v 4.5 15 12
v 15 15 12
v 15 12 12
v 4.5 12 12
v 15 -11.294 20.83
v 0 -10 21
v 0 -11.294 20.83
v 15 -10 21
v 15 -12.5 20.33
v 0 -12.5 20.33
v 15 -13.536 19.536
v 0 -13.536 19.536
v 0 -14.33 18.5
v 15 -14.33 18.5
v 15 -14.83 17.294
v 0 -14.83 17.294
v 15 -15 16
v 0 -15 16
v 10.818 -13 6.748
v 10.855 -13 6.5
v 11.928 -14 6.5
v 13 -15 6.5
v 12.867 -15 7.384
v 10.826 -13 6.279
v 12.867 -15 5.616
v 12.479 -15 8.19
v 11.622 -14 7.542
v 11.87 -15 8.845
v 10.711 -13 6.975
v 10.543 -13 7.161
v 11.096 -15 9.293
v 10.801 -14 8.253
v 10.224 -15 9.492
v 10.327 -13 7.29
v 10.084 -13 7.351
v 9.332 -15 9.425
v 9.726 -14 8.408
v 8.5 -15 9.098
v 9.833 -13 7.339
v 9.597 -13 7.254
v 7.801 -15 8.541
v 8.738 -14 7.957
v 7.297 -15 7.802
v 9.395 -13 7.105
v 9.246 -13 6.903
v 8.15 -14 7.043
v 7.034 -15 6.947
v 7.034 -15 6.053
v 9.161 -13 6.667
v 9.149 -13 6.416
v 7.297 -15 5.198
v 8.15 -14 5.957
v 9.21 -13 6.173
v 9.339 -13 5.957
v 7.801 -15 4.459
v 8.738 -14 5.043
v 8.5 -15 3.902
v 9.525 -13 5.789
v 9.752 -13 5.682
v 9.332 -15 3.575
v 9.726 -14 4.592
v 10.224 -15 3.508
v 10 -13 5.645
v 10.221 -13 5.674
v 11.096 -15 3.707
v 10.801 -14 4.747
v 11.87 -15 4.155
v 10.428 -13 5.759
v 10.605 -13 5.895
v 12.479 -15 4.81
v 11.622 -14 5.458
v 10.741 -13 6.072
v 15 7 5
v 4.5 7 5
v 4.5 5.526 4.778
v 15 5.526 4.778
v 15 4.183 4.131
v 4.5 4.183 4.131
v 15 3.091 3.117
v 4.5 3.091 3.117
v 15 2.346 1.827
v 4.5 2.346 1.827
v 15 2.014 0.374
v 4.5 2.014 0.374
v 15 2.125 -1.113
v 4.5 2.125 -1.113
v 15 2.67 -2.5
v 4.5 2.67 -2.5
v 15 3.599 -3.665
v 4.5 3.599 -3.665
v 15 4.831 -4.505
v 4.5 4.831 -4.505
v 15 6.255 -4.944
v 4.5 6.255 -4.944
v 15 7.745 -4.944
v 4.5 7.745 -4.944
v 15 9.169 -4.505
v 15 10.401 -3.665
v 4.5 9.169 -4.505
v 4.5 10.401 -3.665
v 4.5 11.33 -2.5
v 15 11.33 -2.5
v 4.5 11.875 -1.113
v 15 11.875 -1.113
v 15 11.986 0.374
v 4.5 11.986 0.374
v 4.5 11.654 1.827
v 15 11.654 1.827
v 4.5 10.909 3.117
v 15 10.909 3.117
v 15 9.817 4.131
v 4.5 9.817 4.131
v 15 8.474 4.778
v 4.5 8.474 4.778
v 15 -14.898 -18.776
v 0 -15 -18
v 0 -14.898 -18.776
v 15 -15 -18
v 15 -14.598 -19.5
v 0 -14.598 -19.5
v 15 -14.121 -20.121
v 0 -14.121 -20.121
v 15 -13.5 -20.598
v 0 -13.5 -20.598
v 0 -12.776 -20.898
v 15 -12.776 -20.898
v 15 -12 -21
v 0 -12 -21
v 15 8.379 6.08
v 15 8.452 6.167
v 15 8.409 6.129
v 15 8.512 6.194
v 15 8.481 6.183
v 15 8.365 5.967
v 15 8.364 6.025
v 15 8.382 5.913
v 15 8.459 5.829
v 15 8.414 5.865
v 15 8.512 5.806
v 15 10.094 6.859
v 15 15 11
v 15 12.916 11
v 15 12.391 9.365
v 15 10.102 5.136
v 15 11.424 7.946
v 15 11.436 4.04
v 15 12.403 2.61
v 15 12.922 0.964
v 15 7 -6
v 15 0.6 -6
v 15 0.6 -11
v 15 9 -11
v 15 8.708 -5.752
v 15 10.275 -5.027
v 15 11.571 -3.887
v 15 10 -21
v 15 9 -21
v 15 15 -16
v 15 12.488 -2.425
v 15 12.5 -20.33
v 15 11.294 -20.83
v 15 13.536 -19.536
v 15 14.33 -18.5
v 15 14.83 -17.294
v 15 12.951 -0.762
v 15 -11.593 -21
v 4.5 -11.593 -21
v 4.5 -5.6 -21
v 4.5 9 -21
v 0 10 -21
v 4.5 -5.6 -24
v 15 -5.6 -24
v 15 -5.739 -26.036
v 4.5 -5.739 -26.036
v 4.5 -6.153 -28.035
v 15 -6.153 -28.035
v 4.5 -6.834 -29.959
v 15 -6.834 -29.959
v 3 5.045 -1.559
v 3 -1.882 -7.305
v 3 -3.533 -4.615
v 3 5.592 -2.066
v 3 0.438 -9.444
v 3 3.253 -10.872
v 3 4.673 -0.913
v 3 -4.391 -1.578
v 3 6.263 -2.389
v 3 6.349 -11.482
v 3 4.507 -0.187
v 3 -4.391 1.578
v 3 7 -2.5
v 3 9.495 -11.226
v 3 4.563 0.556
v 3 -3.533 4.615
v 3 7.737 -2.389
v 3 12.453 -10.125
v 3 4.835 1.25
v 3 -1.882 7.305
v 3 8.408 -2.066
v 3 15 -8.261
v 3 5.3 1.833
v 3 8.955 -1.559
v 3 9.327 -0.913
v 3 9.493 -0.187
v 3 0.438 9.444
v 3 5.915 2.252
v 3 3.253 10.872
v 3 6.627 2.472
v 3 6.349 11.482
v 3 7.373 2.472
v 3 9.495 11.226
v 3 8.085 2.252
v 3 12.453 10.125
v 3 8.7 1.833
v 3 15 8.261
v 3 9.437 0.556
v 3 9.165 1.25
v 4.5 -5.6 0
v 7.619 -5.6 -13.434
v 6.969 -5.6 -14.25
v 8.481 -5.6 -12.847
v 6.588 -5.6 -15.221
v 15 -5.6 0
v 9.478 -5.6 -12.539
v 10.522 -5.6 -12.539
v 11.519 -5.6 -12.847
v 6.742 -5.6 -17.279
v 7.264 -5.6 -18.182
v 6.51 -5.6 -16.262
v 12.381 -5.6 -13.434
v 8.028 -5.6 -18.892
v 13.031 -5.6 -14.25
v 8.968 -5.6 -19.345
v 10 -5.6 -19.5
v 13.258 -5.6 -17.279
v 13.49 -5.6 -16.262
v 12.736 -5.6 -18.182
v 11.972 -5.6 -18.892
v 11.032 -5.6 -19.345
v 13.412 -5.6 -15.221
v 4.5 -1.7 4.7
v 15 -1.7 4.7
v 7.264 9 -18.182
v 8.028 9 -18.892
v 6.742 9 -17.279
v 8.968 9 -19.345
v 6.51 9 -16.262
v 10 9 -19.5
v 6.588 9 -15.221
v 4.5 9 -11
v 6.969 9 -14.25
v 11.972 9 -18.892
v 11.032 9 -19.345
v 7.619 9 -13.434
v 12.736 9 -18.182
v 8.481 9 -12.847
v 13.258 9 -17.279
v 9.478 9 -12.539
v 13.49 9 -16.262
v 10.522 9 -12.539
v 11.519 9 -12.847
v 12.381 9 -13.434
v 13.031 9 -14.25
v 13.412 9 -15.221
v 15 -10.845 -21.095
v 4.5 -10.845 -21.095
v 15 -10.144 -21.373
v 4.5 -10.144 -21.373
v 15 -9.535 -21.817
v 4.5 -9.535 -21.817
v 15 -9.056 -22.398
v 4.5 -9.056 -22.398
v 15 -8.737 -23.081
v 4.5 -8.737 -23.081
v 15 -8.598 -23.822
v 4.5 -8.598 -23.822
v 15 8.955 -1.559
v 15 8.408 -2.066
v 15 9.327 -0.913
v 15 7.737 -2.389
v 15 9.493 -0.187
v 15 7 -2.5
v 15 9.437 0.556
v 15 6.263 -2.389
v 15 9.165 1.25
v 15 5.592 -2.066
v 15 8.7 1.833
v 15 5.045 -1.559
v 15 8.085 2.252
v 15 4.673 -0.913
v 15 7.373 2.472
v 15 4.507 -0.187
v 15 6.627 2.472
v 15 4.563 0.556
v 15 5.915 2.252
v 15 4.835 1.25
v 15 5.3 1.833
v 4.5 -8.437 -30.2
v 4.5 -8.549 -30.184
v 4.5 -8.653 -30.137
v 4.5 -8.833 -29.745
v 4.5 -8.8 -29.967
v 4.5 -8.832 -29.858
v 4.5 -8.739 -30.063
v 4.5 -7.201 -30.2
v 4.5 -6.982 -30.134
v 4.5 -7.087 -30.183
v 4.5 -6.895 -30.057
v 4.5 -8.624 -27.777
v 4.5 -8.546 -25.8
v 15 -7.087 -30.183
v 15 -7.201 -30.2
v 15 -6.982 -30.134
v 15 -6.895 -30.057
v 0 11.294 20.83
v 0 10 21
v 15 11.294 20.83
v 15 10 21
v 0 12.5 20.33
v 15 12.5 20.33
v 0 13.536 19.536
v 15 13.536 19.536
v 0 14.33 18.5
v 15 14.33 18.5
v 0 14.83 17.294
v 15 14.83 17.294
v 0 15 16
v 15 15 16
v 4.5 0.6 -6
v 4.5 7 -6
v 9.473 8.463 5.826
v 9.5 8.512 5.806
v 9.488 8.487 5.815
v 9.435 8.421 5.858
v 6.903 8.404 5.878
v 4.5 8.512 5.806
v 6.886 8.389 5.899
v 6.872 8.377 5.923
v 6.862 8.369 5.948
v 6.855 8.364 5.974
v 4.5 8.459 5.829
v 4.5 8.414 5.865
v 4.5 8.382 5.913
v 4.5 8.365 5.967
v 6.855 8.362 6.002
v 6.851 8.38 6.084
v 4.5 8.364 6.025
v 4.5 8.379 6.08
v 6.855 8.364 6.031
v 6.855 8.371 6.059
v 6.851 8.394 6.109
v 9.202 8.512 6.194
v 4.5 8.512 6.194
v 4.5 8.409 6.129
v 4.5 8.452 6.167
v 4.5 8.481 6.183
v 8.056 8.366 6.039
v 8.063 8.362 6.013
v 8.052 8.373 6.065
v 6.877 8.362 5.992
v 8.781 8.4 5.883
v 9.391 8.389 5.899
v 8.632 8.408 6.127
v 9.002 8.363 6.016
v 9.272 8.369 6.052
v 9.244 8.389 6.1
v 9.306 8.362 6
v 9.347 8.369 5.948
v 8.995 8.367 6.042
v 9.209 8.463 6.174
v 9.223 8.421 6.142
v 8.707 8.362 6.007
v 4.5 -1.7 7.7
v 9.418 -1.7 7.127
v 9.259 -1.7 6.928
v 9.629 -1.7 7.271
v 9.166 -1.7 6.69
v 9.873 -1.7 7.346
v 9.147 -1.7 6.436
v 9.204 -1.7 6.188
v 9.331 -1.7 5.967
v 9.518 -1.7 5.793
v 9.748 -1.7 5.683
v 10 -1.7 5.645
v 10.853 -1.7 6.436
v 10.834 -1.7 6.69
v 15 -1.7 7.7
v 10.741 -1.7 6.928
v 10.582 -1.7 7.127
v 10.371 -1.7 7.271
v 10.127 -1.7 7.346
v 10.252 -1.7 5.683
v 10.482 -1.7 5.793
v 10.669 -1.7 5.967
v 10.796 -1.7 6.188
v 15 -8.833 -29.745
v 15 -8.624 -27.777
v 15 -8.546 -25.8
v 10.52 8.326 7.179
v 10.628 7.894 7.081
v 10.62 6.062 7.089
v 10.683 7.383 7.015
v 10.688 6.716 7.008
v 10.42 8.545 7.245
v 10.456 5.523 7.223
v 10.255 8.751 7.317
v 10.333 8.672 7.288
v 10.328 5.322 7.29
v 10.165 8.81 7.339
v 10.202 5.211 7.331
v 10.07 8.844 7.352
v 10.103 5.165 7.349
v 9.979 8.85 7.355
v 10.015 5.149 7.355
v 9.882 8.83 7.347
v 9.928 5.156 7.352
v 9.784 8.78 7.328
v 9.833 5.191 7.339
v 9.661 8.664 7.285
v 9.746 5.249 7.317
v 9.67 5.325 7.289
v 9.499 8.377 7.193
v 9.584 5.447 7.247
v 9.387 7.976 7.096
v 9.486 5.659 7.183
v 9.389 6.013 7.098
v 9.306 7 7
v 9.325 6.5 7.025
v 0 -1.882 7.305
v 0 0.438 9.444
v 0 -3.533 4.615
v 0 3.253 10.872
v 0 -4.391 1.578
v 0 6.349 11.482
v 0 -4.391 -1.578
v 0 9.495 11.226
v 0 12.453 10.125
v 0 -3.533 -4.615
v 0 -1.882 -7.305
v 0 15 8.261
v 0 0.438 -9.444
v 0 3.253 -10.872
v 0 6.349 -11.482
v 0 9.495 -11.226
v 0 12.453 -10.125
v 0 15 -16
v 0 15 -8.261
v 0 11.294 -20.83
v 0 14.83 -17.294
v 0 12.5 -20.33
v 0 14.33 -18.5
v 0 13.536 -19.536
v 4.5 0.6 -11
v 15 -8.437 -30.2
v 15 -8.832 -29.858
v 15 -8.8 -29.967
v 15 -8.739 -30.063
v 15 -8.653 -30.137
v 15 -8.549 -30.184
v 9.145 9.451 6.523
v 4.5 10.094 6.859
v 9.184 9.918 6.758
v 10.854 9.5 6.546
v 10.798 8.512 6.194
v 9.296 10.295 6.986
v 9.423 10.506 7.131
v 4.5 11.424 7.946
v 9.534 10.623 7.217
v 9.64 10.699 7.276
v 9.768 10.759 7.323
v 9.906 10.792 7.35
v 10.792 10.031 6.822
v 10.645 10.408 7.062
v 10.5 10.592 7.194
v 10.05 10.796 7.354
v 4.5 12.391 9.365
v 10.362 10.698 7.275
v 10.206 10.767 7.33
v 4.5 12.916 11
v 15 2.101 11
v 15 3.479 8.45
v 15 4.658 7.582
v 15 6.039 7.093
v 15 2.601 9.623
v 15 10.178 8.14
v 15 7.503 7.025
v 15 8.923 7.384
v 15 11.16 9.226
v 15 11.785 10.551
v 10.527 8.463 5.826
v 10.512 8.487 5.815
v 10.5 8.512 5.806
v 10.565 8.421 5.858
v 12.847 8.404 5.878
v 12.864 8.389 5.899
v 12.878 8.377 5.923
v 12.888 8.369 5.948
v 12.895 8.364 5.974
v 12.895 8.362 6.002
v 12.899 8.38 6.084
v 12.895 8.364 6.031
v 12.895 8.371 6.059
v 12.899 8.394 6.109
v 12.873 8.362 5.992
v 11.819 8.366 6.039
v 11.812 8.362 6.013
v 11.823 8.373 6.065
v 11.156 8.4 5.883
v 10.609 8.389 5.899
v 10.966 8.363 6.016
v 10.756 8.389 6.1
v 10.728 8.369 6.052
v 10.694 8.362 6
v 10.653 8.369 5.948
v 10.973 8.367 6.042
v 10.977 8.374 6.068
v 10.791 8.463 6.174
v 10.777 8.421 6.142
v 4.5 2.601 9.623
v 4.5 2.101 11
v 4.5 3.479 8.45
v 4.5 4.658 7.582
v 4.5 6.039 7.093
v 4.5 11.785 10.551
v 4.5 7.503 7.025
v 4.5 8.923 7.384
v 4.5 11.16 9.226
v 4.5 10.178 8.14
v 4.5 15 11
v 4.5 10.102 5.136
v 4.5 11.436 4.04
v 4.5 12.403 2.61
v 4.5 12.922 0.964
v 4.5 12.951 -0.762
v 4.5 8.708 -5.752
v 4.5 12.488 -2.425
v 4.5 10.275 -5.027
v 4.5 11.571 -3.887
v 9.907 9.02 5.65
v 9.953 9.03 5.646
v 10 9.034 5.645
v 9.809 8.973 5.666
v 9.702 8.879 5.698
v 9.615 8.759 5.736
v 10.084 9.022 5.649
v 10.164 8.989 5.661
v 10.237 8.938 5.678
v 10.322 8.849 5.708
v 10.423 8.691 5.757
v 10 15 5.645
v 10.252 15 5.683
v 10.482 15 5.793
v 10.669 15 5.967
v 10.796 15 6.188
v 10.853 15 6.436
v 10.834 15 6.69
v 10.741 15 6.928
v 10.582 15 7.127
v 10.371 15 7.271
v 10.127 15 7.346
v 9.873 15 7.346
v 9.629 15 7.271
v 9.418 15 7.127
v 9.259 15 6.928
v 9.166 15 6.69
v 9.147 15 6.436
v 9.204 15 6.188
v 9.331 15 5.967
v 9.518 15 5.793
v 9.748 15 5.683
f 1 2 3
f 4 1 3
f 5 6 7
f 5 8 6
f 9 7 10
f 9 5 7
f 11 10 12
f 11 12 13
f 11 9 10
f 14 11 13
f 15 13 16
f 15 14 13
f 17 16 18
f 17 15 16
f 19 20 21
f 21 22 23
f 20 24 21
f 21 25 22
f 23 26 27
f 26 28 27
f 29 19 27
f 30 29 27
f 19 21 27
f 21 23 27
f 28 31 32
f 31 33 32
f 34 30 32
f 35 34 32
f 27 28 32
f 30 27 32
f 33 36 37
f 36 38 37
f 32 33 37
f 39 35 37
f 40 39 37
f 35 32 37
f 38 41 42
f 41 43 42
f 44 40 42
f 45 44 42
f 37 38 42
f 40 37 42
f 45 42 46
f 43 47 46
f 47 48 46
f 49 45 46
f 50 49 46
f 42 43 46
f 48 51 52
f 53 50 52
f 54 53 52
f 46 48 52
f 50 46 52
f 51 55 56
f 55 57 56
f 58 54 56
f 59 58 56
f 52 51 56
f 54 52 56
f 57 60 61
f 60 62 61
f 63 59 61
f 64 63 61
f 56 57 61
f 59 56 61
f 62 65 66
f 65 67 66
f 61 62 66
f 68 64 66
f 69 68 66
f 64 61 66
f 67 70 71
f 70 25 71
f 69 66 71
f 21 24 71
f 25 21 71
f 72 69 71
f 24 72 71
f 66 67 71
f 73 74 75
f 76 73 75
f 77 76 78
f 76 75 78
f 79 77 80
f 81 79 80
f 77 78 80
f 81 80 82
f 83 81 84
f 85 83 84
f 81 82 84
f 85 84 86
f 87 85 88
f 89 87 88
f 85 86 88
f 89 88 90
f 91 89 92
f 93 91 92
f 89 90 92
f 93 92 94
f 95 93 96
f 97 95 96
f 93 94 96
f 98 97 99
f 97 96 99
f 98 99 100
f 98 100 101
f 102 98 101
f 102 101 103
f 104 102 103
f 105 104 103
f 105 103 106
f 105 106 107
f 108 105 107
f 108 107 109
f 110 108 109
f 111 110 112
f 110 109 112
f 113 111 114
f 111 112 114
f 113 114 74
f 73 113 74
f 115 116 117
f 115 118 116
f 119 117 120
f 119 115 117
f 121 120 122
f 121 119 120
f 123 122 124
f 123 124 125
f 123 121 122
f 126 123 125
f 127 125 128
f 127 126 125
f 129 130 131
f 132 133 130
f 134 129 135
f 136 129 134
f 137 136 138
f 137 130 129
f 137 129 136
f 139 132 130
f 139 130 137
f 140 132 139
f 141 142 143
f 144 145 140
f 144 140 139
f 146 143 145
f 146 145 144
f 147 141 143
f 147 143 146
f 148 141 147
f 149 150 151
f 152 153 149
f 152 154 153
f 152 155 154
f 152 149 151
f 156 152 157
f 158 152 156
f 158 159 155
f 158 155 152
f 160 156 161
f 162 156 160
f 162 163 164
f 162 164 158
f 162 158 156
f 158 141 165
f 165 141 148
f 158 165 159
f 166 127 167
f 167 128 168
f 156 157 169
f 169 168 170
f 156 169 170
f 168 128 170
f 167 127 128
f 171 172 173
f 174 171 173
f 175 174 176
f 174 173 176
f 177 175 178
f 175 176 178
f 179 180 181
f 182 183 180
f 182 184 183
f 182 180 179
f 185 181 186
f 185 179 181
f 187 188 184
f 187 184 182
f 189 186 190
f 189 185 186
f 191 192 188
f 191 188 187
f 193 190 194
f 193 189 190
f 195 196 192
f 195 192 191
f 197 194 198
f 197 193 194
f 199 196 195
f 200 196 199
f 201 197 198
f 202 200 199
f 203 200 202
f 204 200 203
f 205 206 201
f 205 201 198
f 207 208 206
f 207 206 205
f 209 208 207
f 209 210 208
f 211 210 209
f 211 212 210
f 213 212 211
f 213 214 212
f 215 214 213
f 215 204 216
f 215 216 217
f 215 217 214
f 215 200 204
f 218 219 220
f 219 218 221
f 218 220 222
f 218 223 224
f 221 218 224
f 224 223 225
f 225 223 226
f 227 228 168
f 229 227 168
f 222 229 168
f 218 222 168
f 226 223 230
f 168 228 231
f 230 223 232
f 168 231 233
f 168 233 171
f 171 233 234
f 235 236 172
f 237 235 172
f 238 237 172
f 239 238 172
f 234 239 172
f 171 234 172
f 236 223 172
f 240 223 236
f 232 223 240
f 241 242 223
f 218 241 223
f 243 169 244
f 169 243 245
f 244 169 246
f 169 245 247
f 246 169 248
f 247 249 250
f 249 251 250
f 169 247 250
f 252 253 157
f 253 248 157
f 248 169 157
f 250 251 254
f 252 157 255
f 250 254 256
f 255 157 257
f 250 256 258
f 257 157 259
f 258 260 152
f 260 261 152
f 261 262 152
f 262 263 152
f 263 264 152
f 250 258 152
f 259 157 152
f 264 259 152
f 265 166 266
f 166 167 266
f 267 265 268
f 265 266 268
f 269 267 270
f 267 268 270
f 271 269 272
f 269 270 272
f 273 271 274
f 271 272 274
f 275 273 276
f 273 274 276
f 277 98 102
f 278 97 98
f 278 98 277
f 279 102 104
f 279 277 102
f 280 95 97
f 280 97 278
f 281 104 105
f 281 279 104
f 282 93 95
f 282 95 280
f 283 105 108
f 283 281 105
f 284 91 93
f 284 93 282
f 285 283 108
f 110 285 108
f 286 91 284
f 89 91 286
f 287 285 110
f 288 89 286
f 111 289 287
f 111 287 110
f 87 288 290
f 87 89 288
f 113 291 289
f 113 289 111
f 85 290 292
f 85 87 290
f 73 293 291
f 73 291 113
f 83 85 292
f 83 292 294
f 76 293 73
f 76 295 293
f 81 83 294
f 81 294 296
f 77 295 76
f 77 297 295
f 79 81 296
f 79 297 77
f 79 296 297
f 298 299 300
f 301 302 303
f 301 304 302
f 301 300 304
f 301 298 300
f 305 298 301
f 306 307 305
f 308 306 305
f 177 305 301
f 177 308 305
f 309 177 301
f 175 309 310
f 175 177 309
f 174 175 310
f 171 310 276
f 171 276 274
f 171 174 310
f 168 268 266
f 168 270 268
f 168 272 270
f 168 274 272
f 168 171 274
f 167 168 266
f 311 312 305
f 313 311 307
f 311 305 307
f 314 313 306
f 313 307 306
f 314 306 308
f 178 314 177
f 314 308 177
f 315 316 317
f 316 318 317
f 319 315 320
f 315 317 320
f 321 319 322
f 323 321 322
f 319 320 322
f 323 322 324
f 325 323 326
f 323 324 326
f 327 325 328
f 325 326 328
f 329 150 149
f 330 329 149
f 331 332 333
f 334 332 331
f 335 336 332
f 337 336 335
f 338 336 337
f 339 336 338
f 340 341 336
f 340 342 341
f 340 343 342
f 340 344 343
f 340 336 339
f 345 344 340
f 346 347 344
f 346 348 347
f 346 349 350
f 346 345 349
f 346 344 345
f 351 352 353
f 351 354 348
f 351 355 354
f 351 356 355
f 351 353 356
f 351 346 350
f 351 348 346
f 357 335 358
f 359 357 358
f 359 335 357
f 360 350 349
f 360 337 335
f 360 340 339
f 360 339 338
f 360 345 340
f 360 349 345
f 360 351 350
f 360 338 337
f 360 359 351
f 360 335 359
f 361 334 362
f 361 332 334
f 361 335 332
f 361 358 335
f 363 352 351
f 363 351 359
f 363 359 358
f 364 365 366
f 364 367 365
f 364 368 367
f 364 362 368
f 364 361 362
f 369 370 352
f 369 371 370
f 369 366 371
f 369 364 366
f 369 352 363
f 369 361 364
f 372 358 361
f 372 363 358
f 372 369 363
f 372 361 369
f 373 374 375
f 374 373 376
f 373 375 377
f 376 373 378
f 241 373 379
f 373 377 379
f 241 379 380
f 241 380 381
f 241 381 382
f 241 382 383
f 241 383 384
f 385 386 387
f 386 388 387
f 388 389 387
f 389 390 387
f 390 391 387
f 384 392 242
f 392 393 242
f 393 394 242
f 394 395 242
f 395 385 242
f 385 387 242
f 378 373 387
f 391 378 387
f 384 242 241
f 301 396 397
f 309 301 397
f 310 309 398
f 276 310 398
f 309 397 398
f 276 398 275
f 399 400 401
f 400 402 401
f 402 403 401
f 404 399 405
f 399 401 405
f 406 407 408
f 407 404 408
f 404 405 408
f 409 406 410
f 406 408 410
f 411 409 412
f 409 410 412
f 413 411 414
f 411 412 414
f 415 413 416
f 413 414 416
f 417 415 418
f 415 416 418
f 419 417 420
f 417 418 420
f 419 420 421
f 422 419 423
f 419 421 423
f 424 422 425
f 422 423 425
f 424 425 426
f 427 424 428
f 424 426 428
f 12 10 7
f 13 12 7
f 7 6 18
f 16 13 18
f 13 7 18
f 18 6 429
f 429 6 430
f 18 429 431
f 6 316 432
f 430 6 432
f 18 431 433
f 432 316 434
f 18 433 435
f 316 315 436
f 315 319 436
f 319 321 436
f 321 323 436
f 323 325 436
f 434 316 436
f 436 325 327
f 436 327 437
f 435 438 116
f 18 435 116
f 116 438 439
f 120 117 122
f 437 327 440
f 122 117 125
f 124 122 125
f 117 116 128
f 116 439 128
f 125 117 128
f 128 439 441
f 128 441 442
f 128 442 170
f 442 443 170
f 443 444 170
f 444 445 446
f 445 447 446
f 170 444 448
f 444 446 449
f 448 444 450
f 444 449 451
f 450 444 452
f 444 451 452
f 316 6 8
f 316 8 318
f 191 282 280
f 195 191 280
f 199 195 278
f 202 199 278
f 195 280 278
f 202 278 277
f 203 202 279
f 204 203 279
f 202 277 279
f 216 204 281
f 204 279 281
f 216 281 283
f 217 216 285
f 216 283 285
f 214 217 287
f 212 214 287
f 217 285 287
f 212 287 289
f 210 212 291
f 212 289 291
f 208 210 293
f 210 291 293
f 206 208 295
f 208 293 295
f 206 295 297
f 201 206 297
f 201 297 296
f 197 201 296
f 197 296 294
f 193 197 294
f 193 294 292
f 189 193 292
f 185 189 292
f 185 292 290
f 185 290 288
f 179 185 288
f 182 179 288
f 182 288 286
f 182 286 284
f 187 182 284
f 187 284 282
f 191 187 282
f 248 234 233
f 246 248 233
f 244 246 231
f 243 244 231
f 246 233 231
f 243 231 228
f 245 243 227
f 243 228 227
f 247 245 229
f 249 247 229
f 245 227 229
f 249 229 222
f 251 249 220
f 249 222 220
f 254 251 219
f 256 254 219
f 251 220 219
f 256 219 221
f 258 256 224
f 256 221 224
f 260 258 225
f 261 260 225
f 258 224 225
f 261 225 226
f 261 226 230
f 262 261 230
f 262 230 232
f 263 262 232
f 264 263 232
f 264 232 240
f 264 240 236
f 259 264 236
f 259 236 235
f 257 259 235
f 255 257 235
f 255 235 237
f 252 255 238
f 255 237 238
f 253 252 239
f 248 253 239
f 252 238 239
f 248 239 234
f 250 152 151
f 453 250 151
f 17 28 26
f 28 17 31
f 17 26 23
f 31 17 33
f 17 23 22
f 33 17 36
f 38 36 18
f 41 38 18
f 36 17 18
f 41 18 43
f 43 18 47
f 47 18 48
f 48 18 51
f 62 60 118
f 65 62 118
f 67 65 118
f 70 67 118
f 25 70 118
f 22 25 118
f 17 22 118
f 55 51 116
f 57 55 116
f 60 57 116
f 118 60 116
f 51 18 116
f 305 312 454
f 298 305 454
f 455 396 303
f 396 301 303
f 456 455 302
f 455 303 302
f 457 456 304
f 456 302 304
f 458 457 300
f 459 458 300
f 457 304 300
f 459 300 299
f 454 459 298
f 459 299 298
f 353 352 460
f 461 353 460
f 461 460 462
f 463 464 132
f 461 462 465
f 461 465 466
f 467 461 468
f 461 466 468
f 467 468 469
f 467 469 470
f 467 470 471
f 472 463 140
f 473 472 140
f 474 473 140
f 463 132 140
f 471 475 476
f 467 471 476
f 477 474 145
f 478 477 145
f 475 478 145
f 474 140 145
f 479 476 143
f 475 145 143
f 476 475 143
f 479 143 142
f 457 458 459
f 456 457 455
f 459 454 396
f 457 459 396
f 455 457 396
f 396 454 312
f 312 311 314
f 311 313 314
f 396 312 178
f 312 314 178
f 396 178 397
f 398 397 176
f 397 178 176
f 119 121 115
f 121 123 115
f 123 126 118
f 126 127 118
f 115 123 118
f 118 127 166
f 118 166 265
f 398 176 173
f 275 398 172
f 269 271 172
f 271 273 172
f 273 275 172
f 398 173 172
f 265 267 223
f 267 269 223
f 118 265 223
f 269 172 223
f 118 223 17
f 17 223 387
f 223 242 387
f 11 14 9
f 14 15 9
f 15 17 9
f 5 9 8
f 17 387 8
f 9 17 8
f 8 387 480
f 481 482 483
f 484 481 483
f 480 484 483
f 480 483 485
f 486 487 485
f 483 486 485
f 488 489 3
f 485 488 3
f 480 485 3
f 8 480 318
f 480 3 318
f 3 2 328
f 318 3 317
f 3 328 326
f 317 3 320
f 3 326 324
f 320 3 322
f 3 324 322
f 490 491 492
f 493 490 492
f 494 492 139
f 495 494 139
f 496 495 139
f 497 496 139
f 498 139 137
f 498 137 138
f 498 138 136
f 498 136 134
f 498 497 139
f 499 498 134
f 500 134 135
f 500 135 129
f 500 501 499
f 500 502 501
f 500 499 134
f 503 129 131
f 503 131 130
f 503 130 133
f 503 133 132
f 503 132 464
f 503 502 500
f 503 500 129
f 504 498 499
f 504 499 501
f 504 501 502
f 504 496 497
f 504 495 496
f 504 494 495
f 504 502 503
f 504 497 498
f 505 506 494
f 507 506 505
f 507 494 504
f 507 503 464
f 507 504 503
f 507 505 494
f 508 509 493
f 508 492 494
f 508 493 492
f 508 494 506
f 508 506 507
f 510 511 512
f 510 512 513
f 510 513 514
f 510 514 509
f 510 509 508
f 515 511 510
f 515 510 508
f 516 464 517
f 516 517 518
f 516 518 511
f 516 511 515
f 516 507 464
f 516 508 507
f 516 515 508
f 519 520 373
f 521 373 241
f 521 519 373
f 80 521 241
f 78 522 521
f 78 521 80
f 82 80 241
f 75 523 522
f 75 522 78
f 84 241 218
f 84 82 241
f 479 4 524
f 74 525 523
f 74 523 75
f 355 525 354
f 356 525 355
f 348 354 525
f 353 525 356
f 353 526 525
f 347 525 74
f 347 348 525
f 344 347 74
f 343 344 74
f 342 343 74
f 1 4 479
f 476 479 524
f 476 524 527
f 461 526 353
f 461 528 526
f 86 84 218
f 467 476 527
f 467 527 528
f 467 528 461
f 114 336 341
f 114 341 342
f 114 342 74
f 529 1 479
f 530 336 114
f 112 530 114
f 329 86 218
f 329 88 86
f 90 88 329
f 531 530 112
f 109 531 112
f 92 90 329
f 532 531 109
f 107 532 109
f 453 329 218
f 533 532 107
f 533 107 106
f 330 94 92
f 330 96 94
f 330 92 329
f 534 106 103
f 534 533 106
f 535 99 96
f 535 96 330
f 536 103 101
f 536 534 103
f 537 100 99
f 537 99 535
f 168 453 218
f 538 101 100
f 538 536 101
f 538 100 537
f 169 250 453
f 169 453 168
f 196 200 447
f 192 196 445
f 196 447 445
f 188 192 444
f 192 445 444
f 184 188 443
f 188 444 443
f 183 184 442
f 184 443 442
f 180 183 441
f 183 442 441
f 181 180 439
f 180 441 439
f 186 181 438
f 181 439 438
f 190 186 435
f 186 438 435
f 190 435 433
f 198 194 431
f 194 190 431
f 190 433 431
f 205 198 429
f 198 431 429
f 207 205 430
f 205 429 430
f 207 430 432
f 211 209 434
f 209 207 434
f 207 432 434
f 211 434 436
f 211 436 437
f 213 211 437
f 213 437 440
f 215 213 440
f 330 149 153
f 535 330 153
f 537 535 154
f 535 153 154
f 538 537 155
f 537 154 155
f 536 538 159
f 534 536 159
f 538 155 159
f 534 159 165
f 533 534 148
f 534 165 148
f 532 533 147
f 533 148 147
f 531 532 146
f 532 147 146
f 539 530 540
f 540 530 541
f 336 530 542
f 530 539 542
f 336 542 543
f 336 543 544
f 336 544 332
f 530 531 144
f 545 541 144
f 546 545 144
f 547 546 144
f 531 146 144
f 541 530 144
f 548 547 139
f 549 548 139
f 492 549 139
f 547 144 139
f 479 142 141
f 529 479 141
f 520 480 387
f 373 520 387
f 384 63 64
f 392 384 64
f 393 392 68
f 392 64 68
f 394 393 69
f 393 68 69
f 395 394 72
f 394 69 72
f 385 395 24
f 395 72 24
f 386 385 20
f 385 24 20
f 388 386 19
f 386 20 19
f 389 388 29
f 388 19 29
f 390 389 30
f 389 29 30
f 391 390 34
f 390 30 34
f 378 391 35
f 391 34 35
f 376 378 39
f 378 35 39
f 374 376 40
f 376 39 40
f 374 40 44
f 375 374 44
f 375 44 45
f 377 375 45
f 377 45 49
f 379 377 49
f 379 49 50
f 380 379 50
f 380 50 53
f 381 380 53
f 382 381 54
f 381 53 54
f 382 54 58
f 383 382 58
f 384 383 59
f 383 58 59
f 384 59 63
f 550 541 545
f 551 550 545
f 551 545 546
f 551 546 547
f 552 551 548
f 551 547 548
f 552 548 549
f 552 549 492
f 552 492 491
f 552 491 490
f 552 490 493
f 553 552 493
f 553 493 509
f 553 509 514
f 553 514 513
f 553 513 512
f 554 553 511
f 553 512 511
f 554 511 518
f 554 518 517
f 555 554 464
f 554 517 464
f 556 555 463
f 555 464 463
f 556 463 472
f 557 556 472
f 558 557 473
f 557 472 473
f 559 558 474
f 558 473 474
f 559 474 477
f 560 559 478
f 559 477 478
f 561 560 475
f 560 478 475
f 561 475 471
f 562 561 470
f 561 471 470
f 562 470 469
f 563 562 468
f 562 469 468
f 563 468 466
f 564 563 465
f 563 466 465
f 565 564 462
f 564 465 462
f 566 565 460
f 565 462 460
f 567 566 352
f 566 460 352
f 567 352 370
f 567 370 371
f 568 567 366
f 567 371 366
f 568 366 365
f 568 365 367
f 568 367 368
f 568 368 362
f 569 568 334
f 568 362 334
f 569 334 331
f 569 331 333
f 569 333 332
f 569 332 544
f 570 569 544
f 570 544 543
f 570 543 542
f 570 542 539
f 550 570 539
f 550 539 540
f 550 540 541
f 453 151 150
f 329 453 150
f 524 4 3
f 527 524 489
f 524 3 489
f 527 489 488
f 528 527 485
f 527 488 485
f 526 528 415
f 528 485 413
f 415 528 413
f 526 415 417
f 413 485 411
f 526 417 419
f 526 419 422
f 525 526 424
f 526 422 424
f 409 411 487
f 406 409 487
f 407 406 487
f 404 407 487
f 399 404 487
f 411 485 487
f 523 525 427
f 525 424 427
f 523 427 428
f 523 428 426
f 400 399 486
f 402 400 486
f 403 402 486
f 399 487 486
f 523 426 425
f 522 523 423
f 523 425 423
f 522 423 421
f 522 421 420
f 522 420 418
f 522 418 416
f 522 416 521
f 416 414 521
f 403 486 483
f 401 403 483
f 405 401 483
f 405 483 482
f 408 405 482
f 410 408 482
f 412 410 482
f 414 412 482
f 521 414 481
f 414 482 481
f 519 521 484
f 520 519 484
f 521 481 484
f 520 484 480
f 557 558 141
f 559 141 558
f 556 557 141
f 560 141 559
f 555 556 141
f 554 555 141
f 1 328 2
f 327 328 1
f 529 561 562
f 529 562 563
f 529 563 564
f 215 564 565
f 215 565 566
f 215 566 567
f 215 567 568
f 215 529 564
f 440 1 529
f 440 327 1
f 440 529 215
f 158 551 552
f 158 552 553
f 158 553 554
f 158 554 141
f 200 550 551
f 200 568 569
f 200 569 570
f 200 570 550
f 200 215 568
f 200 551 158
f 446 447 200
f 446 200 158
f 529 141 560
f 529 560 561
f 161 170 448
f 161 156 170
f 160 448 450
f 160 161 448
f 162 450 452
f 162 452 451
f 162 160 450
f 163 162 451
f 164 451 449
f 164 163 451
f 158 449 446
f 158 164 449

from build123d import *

# Parameters (mm, degrees)
SKETCH1_W           = 42
SKETCH1_H           = 30
BOSS_EXTRUDE1_DEPTH = 15
FILLET1_R           = 5
CUT_EXTRUDE1_DEPTH  = 10.5
FILLET2_R           = 0.2
SKETCH3_R           = 3.5
BOSS_EXTRUDE2_DEPTH = 14.6
SKETCH4_R           = 5
BOSS_EXTRUDE3_DEPTH = 10.5
SKETCH5_R           = 3
CUT_EXTRUDE2_DEPTH  = 2
CUT_EXTRUDE2_DRAFT  = -47
SKETCH6_R           = 0.85526258
CUT_EXTRUDE3_DEPTH  = 39.078865697
SKETCH7_R           = 2.5
CUT_EXTRUDE4_DEPTH  = 30.849623234
BOSS_EXTRUDE4_DEPTH = 10.5
FILLET3_R           = 3
FILLET4_R           = 0.4
SKETCH9_R           = 11.5
CUT_EXTRUDE5_DEPTH  = 3


with BuildPart() as part:
    # Sketch1 → Boss-Extrude1 (new body)
    with BuildSketch(Plane(origin=(0, 0, 0), x_dir=(0, 0, -1), z_dir=(1, 0, 0))):
        Rectangle(SKETCH1_W, SKETCH1_H)
    extrude(amount=BOSS_EXTRUDE1_DEPTH)

    # Fillet1
    fillet1_edges = [part.edges().sort_by_distance(p)[0] for p in [
        (7.5, 15, 21),
        (7.5, 15, -21),
        (7.5, -15, 21),
    ]]
    fillet(fillet1_edges, radius=FILLET1_R)

    # Sketch2 → Cut-Extrude1 (cut)
    with BuildSketch(Plane(origin=(15, 0, 0), x_dir=(0, 0, -1), z_dir=(1, 0, 0))):
        with BuildLine():
            Line((21, 9), (11, 9))
            Line((11, 9), (11, 0.6))
            Line((11, 0.6), (6, 0.6))
            Line((6, 0.6), (6, 7))
            ThreePointArc((6, 7), (0, 13), (-6, 7))
            ThreePointArc((-6, 7), (-7.417424305, 10.872983346), (-11, 12.916079783))
            Line((-11, 12.916079783), (-11, 15))
            Line((-11, 15), (-12, 15))
            Line((-12, 15), (-12, 12))
            ThreePointArc((-12, 12), (-7.025319235, 7.50254481), (-11, 2.101020514))
            Line((-11, 2.101020514), (-7.7, -1.7))
            Line((-7.7, -1.7), (-4.7, -1.7))
            Line((-4.7, -1.7), (0, -5.6))
            Line((0, -5.6), (11, -5.6))
            Line((11, -5.6), (21, -5.6))
            Line((21, -5.6), (21, 9))
        make_face()
    extrude(amount=-CUT_EXTRUDE1_DEPTH, mode=Mode.SUBTRACT)

    # Fillet2
    fillet2_edges = [part.edges().sort_by_distance(p)[0] for p in [
        (9.75, 7, 6),
    ]]
    fillet(fillet2_edges, radius=FILLET2_R)

    # Sketch3 → Boss-Extrude2 (add)
    with BuildSketch(Plane(origin=(0, -5.6, 0), x_dir=(1, 0, 0), z_dir=(0, 1, 0))):
        with Locations(Location((10, 16, 0), (0, 0, 90))):
            Circle(SKETCH3_R)
    extrude(amount=BOSS_EXTRUDE2_DEPTH)

    # Sketch4 → Boss-Extrude3 (add)
    with BuildSketch(Plane(origin=(4.5, 0, 0), x_dir=(0, 0, -1), z_dir=(1, 0, 0))):
        with Locations(Location((0, 7, 0), (0, 0, 180))):
            Circle(SKETCH4_R)
    extrude(amount=BOSS_EXTRUDE3_DEPTH)


with BuildPart() as cut_extrude2_tool:
    # Sketch5 → Cut-Extrude2 (with draft: the straight prism first)
    with BuildSketch(Plane.XZ.offset(15)):
        with Locations((10, 6.5)):
            Circle(SKETCH5_R)
    extrude(amount=-CUT_EXTRUDE2_DEPTH)
    # Cut-Extrude2: the draft: its side faces are tilted about the plane it starts from
    cut_extrude2_sides = [cut_extrude2_tool.faces().sort_by_distance(p)[0] for p in [
        (7, -14, 6.5),
    ]]
    draft(cut_extrude2_sides, Plane.XZ.offset(15), CUT_EXTRUDE2_DRAFT)


with BuildPart() as part_1:
    add(part.part)

    # Cut-Extrude2: cut by cut_extrude2_tool
    add(cut_extrude2_tool.part, mode=Mode.SUBTRACT)

    # Sketch6 → Cut-Extrude3 (cut, through all)
    with BuildSketch(Plane.XZ.offset(13)):
        with Locations(Location((10, 6.5, 0), (0, 0, 270))):
            Circle(SKETCH6_R)
    extrude(amount=-CUT_EXTRUDE3_DEPTH, mode=Mode.SUBTRACT)

    # Sketch7 → Cut-Extrude4 (cut, through all)
    with BuildSketch(Plane(origin=(15, 0, 0), x_dir=(0, 0, -1), z_dir=(1, 0, 0))):
        with Locations((0, 7)):
            Circle(SKETCH7_R)
    extrude(amount=-CUT_EXTRUDE4_DEPTH, mode=Mode.SUBTRACT)

    # Sketch8 → Boss-Extrude4 (add)
    with BuildSketch(Plane(origin=(15, 0, 0), x_dir=(0, 0, -1), z_dir=(1, 0, 0))):
        with BuildLine():
            Line((21, -5.6), (24, -5.6))
            ThreePointArc((24, -5.6), (27.171714604, -5.939160103), (30.2, -6.941303137))
            Line((30.2, -6.941303137), (30.2, -8.9))
            ThreePointArc((30.2, -8.9), (25.6, -8.545235705), (21, -8.9))
            Line((21, -8.9), (21, -5.6))
        make_face()
    extrude(amount=-BOSS_EXTRUDE4_DEPTH)

    # Fillet3
    fillet3_edges = [part_1.edges().sort_by_distance(p)[0] for p in [
        (9.75, -8.9, -21),
        (7.5, -15, -21),
    ]]
    fillet(fillet3_edges, radius=FILLET3_R)

    # Fillet4
    fillet4_edges = [part_1.edges().sort_by_distance(p)[0] for p in [
        (9.75, -6.941303137, -30.2),
        (9.75, -8.9, -30.2),
    ]]
    fillet(fillet4_edges, radius=FILLET4_R)

    # Sketch9 → Cut-Extrude5 (cut)
    with BuildSketch(Plane.ZY):
        with Locations((0, 7)):
            Circle(SKETCH9_R)
    extrude(amount=-CUT_EXTRUDE5_DEPTH, mode=Mode.SUBTRACT)


solid = part_1.part
